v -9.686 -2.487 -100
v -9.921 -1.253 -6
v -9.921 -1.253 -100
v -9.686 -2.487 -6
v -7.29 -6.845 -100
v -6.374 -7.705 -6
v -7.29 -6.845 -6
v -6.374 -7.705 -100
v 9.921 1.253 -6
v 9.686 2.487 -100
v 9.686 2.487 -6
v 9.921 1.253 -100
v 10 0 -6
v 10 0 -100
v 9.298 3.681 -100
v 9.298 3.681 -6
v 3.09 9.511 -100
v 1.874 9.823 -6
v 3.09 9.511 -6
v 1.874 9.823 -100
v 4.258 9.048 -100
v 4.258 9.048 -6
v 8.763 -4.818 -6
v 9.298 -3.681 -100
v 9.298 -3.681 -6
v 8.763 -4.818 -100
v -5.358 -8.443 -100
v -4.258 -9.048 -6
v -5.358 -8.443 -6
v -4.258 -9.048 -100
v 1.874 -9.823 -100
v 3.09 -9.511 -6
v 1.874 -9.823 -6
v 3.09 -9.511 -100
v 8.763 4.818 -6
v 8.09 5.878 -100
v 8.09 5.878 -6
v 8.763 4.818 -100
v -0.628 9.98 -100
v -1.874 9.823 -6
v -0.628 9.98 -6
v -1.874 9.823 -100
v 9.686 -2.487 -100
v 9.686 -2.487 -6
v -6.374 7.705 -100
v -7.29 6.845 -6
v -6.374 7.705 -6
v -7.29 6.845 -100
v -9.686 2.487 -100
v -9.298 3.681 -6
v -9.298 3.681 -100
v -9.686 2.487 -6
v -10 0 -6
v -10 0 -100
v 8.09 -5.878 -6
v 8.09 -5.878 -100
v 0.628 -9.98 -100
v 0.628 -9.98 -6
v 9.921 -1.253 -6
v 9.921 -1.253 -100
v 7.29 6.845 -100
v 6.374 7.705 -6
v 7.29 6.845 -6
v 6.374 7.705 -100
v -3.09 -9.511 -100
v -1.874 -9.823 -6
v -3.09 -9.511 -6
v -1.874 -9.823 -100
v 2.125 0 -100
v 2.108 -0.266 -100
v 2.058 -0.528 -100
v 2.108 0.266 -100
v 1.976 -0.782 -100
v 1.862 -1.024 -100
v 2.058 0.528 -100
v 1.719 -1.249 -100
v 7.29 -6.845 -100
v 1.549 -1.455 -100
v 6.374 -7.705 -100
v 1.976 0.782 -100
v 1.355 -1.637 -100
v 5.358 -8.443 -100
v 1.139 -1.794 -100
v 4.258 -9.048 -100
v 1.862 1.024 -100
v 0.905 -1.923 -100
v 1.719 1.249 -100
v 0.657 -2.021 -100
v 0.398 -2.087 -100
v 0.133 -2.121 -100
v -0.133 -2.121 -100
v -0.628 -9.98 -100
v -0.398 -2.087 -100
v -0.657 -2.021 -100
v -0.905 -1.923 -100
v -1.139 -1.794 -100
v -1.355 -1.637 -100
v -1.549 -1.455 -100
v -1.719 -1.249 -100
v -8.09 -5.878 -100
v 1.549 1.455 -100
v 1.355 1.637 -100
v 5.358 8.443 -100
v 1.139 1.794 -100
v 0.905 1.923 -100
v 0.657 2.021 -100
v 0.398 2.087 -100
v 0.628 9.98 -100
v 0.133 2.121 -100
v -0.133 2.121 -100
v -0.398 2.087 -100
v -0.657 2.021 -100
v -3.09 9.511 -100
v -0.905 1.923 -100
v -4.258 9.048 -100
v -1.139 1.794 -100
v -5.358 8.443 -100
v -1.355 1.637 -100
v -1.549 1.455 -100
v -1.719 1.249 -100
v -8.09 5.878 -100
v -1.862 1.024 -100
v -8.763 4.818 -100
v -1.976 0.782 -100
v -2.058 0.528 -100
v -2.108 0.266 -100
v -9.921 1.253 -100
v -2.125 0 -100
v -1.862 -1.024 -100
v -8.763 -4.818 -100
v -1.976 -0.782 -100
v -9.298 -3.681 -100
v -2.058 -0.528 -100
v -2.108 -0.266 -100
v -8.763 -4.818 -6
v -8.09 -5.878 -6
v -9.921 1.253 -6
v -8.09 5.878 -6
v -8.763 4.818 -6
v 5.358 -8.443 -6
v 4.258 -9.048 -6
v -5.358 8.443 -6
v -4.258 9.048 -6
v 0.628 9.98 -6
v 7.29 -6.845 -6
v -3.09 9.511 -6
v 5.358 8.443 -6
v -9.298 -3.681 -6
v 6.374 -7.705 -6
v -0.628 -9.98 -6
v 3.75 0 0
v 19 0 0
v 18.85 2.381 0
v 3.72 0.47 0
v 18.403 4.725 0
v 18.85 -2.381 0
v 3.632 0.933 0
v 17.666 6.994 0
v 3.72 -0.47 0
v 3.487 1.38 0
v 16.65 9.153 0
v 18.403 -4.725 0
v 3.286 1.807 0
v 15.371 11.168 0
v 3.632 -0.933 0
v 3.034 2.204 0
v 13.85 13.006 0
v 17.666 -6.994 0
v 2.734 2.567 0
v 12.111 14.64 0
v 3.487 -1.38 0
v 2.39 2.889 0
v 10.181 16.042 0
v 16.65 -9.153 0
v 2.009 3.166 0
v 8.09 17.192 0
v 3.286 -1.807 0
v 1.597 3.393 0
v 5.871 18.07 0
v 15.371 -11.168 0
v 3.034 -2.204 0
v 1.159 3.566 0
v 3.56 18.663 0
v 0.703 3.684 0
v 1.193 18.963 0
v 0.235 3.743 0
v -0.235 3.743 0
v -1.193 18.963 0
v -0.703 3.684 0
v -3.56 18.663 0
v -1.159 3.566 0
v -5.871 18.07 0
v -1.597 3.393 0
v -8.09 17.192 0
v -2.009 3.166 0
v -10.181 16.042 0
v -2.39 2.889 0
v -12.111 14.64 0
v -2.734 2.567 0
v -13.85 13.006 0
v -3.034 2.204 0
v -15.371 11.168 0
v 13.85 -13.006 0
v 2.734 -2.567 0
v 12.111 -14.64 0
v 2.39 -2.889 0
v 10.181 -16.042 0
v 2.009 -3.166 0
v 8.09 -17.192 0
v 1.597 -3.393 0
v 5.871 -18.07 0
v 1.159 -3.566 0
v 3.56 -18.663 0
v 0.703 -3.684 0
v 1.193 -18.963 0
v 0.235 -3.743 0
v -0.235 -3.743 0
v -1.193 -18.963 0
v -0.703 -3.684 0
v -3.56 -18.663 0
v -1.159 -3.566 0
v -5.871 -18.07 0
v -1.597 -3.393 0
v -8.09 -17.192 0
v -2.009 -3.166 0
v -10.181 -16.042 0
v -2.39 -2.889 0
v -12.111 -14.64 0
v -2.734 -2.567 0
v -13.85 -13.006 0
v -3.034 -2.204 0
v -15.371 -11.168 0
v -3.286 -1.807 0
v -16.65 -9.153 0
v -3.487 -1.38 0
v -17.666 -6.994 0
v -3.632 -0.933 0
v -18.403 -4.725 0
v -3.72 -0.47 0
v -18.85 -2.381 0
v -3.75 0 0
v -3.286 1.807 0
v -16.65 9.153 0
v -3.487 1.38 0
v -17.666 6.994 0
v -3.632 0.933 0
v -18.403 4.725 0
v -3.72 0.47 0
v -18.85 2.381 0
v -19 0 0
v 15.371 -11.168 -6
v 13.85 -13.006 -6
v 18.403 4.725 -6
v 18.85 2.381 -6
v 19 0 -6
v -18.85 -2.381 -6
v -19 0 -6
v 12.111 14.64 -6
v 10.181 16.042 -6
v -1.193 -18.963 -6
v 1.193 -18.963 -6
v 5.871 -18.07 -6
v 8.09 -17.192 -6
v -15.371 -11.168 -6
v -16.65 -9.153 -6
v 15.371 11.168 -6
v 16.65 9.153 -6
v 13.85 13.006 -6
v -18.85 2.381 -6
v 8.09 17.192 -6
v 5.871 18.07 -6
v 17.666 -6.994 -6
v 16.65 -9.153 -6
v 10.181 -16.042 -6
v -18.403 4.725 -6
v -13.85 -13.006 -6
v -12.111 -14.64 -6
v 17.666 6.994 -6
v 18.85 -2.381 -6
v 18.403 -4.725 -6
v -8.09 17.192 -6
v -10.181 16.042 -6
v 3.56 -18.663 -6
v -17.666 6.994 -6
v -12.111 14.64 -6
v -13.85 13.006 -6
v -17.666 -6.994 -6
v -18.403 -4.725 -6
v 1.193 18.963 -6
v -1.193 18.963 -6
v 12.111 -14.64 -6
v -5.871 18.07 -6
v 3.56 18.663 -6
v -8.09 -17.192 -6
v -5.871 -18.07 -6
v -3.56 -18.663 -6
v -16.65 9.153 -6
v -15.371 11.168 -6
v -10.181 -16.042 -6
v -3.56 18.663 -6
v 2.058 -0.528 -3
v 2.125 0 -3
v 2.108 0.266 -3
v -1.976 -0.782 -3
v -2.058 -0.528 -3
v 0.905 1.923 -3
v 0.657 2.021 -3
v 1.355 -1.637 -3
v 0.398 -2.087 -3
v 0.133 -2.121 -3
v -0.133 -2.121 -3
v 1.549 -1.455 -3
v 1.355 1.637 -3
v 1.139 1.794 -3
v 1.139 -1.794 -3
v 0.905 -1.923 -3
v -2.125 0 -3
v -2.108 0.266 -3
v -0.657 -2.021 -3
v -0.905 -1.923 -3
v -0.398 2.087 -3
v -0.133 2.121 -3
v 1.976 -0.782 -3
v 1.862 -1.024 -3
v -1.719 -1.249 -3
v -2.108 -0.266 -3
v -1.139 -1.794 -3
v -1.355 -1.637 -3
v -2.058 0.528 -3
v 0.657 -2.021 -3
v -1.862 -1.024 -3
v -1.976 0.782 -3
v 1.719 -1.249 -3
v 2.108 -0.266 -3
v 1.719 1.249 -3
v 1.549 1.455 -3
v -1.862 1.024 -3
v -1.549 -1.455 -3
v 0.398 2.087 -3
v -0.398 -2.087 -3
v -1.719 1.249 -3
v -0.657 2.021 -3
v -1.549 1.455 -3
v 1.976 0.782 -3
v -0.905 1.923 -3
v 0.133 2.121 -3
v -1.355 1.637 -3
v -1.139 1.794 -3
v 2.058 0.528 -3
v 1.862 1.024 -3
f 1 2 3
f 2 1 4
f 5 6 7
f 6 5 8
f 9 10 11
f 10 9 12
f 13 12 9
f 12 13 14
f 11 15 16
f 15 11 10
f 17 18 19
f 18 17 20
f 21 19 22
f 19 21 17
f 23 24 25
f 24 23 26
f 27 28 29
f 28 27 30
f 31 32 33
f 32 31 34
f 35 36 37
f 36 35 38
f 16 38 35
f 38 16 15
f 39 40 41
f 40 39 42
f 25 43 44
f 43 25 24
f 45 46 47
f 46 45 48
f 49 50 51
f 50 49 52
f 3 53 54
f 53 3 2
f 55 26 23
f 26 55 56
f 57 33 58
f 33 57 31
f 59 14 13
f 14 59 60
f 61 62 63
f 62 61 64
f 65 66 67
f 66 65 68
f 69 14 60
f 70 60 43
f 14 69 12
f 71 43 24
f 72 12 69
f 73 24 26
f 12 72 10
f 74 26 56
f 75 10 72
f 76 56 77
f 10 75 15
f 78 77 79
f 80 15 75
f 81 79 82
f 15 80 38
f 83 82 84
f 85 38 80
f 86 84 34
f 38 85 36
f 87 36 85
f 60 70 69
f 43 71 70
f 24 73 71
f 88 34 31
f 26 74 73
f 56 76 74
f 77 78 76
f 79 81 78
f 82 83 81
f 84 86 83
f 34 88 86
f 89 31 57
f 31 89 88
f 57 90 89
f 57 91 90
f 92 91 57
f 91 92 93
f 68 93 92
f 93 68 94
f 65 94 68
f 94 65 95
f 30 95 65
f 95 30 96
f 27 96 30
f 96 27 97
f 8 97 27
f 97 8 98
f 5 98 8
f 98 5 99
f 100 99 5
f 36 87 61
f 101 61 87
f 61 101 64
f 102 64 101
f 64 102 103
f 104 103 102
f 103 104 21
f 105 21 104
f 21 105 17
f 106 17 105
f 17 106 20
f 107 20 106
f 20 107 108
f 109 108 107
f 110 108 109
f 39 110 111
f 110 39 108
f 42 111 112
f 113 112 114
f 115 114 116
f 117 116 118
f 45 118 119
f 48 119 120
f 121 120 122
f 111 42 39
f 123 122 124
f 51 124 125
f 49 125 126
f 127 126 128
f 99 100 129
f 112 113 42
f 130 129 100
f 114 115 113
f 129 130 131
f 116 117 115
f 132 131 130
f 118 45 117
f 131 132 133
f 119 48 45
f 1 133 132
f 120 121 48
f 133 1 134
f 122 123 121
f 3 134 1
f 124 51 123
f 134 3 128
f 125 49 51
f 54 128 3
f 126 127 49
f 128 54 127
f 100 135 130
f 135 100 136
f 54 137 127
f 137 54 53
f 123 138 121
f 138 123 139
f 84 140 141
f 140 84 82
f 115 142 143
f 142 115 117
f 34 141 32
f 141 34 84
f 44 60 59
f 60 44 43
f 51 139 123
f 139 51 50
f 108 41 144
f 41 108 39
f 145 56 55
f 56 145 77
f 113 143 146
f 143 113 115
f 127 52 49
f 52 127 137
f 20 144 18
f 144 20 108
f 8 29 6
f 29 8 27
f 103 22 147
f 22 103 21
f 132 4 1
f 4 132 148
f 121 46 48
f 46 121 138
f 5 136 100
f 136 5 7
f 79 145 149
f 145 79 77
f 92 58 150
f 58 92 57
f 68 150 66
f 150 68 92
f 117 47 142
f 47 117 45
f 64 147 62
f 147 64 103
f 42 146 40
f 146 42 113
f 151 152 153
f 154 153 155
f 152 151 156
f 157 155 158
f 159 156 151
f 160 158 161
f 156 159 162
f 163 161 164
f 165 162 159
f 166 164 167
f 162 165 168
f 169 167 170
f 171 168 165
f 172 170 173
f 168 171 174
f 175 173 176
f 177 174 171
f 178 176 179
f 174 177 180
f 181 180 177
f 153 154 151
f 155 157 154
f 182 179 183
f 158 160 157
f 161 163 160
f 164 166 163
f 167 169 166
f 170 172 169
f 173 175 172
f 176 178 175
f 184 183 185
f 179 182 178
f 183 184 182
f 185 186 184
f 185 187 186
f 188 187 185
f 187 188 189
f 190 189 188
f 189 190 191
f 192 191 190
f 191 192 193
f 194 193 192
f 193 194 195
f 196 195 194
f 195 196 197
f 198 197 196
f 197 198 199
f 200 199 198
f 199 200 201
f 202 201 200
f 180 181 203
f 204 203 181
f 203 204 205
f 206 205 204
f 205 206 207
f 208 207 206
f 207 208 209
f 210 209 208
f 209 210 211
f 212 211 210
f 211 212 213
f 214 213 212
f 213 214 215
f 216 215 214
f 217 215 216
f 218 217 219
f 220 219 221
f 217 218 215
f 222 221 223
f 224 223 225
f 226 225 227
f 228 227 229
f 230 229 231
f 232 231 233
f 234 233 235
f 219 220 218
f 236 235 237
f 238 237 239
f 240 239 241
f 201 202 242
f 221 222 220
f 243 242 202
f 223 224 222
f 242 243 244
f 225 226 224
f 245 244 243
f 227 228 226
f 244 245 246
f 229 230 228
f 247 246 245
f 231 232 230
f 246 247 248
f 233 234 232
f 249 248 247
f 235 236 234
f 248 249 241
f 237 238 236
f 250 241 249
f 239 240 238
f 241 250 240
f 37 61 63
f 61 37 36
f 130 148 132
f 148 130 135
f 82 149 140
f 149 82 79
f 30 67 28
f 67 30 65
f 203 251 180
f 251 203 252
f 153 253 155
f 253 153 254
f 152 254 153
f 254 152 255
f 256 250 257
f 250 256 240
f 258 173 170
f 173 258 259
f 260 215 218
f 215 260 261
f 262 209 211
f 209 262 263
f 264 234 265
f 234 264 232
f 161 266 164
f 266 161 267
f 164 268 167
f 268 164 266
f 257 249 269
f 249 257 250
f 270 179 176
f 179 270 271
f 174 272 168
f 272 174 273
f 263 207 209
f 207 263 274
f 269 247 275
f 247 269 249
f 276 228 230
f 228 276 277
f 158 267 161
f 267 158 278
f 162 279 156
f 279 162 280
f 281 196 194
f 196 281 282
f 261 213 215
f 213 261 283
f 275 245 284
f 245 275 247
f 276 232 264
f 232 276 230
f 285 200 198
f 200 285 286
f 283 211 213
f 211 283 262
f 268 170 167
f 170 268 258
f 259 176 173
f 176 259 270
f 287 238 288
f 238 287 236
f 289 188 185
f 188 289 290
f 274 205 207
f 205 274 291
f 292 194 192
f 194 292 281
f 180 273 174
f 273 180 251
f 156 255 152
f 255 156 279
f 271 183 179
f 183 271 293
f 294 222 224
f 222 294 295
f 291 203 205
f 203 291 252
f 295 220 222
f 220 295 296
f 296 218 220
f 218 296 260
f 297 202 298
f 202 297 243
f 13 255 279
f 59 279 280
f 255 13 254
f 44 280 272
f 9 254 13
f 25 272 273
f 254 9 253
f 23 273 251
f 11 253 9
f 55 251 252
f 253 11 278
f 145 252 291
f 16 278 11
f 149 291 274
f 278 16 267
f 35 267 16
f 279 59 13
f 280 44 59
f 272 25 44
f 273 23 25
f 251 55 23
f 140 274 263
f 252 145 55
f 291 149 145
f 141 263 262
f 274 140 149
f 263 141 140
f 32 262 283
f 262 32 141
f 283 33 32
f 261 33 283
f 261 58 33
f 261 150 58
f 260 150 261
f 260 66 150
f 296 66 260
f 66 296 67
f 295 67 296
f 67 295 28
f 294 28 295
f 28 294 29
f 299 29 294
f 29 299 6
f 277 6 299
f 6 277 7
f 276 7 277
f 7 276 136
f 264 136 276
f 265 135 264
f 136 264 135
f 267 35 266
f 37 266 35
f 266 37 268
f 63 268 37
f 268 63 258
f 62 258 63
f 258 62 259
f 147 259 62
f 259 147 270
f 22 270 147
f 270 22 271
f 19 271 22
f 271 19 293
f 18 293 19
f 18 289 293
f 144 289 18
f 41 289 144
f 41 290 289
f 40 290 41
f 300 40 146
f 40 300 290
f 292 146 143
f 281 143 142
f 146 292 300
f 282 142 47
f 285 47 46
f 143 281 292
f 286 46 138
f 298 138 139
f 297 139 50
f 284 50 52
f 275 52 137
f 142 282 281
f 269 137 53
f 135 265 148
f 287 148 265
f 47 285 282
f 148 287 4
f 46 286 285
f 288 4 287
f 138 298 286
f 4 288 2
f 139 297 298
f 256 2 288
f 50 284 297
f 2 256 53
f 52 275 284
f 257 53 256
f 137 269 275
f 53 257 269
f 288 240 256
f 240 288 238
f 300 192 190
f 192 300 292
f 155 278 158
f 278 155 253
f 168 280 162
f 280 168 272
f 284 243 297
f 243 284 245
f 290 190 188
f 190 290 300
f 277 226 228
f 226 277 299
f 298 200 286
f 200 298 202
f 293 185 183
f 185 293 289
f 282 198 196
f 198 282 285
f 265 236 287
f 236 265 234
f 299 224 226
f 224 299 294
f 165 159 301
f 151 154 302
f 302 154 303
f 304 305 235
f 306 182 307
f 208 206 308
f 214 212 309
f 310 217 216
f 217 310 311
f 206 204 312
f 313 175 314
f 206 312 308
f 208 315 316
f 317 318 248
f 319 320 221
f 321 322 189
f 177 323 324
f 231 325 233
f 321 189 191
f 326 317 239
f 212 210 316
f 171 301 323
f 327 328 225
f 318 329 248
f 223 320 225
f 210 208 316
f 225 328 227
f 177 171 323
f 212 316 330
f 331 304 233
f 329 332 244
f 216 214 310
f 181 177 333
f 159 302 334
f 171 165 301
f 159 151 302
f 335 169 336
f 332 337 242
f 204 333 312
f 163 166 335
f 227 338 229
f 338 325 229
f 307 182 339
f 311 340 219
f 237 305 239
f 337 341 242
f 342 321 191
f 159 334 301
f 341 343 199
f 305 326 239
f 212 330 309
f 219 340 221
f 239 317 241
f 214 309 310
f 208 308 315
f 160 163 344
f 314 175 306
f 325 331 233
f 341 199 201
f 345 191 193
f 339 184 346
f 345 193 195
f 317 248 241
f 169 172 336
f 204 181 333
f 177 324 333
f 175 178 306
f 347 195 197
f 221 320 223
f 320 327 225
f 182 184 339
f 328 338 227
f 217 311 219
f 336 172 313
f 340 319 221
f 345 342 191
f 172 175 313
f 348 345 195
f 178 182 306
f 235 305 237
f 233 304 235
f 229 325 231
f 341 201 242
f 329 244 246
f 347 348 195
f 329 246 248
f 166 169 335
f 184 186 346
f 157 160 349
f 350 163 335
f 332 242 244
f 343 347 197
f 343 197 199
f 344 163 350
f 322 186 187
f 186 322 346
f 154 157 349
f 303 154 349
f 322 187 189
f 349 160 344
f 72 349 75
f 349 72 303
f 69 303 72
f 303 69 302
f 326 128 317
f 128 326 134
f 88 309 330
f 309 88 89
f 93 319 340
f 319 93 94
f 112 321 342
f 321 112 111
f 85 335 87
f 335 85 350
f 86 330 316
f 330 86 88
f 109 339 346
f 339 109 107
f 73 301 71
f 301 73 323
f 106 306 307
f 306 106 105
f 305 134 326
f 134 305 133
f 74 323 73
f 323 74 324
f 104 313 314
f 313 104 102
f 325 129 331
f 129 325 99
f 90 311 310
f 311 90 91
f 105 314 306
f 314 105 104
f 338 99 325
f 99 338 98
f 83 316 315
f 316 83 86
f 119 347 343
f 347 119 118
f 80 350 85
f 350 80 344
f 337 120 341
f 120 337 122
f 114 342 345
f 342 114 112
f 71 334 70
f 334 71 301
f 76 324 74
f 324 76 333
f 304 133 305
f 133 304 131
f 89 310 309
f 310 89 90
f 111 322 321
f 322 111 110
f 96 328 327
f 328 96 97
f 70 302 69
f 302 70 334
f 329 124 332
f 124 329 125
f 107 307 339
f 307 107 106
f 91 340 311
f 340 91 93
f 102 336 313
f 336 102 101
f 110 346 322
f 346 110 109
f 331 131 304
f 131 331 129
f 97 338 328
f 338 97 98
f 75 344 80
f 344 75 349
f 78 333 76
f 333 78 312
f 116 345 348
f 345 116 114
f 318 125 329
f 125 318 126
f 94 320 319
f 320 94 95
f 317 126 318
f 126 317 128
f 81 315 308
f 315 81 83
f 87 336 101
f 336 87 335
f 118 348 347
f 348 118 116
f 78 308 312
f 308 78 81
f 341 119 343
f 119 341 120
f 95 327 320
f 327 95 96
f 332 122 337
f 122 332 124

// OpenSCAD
$fn = 50;


difference() {
	union() {
		translate(v = [0, 0, -100.0000000000]) {
			cylinder(h = 100, r = 10.0000000000);
		}
		translate(v = [0, 0, -6.0000000000]) {
			cylinder(h = 6, r = 19.0000000000);
		}
	}
	union() {
		translate(v = [0, 0, 0]) {
			rotate(a = [0, 0, 0]) {
				difference() {
					union() {
						#translate(v = [0, 0, -100.0000000000]) {
							cylinder(h = 100, r = 2.0000000000);
						}
						#translate(v = [0, 0, -3]) {
							cylinder(h = 3, r = 10.0000000000, r1 = 2.1250000000, r2 = 3.7500000000);
						}
						#translate(v = [0, 0, -100.0000000000]) {
							cylinder(h = 100, r = 2.1250000000);
						}
						#translate(v = [0, 0, -100.0000000000]) {
							cylinder(h = 100, r = 2.0000000000);
						}
					}
					union();
				}
			}
		}
	}
}
